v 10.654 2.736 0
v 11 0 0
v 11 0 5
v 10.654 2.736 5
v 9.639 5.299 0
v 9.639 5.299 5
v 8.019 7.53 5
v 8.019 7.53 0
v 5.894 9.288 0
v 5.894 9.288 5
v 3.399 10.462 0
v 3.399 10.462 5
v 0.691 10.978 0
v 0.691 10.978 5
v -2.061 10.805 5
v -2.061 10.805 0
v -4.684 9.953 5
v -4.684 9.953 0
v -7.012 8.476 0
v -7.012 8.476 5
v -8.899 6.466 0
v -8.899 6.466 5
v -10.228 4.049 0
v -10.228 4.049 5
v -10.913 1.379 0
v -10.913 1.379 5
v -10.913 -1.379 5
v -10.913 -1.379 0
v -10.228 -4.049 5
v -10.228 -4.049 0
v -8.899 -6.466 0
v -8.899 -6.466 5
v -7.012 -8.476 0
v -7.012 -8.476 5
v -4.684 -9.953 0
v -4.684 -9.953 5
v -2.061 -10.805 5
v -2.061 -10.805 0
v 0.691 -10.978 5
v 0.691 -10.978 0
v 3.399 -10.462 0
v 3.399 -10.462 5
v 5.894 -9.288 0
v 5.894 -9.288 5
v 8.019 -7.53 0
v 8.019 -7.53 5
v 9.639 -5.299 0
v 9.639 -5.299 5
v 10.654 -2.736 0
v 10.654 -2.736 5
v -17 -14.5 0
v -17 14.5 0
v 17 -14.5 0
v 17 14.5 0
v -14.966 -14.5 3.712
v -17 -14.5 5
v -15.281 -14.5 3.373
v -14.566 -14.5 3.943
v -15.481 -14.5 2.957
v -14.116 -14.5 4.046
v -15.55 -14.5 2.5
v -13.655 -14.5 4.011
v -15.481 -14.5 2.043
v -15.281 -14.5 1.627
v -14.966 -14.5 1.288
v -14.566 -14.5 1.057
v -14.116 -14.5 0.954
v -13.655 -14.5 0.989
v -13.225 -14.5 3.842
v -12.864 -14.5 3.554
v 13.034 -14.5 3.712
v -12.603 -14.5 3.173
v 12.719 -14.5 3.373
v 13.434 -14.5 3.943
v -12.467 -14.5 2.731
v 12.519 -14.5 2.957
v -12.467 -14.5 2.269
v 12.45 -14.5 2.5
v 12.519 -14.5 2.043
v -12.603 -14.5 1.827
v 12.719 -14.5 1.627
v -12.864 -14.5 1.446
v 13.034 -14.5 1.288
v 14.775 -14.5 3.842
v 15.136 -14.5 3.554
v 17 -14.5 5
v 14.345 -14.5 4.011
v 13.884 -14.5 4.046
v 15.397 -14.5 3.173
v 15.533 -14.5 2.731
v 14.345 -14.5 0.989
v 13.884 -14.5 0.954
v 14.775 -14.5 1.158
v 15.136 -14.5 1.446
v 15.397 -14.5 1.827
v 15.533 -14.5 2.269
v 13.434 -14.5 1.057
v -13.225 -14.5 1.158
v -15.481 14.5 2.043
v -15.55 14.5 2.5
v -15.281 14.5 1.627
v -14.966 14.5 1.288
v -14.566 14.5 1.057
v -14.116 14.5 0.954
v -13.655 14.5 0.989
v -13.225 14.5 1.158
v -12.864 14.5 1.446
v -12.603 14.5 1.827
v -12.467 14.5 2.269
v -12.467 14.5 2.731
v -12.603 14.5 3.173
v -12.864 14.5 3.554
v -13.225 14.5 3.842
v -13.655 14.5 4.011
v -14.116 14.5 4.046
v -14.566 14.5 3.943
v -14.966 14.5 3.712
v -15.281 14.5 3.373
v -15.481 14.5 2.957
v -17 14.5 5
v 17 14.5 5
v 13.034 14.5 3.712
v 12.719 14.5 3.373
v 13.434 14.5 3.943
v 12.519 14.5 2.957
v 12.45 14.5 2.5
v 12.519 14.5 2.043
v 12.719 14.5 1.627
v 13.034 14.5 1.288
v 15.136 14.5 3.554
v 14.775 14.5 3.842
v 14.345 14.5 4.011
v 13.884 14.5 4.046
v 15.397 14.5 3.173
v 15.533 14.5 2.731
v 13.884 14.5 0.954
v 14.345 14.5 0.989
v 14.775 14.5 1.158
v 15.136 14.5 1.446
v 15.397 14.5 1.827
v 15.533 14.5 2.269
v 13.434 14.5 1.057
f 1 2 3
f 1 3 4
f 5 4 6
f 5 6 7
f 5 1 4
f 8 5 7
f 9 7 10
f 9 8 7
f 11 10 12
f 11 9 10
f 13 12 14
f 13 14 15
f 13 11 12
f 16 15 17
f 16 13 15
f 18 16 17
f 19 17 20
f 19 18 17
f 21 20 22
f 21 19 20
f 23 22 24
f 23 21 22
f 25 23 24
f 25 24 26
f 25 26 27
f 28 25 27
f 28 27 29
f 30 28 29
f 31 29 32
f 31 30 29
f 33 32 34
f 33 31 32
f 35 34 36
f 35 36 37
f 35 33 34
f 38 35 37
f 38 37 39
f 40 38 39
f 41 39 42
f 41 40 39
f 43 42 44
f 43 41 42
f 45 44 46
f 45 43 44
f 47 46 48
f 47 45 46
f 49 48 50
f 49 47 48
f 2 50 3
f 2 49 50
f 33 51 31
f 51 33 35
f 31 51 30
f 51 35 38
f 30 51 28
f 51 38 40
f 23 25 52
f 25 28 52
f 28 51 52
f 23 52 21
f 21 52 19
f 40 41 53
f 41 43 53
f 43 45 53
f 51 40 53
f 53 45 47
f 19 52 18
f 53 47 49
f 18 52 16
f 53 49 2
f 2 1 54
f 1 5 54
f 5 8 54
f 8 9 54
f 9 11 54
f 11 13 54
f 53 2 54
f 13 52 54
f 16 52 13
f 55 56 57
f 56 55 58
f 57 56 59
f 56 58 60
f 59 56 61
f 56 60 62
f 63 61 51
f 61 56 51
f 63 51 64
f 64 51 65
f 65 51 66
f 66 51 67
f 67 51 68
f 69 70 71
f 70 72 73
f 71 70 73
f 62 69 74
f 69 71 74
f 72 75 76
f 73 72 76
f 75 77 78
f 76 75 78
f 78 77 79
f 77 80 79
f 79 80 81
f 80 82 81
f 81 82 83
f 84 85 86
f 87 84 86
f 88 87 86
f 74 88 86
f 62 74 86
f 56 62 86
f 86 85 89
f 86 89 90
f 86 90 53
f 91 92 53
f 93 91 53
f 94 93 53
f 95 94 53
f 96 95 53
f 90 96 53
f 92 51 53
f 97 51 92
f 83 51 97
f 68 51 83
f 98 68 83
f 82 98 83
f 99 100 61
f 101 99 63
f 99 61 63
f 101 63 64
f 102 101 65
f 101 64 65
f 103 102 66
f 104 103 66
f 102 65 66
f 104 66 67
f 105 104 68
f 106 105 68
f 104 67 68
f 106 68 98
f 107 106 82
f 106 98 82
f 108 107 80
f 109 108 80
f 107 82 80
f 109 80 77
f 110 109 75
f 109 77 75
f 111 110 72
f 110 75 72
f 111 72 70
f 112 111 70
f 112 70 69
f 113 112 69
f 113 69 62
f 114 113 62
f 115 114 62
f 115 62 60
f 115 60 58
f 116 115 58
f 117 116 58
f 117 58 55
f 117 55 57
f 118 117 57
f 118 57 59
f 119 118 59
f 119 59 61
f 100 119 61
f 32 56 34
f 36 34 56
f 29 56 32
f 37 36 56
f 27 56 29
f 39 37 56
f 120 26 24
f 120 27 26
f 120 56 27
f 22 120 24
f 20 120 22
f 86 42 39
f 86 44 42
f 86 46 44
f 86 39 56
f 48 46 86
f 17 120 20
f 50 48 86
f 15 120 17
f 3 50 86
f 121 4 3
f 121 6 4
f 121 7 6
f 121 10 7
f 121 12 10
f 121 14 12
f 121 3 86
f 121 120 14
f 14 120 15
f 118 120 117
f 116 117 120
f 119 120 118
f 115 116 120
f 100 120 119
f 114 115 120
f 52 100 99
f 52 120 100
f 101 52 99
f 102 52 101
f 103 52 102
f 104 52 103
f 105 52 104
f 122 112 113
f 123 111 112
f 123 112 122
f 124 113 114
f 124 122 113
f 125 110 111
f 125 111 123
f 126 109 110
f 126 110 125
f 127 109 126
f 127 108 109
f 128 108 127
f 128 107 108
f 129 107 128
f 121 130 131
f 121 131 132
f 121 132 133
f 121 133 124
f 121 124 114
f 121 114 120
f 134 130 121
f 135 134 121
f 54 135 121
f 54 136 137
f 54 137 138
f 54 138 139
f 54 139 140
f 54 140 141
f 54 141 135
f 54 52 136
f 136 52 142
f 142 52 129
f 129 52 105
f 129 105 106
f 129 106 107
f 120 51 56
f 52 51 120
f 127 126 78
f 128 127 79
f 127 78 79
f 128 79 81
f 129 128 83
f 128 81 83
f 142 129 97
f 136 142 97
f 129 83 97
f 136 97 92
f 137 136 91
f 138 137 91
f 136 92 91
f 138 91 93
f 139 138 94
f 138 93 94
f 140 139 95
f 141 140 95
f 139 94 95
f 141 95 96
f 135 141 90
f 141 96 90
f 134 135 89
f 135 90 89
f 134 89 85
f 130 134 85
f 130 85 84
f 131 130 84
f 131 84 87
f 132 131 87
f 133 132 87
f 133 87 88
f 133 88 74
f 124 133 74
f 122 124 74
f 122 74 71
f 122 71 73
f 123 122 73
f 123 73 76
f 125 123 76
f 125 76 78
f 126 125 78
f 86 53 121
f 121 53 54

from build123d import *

# Parameters (mm, degrees)
SKETCH_1_W      = 34
SKETCH_1_H      = 29
SKETCH_1_R      = 11
EXTRUDE_1_DEPTH = 5
HOLE_WIZARD_1_D = 3.1


with BuildPart() as part:
    # 草图1 → 凸台-拉伸1 (new body)
    with BuildSketch(Plane.XY):
        Rectangle(SKETCH_1_W, SKETCH_1_H)
        Circle(SKETCH_1_R, mode=Mode.SUBTRACT)
    extrude(amount=EXTRUDE_1_DEPTH)

    # 孔1 (through all)
    with Locations(Plane(origin=(0, 14.5, 0), x_dir=(1, 0, 0), z_dir=(0, 1, 0))):
        with Locations((-14, -2.5), (14, -2.5)):
            Hole(HOLE_WIZARD_1_D / 2)


solid = part.part
